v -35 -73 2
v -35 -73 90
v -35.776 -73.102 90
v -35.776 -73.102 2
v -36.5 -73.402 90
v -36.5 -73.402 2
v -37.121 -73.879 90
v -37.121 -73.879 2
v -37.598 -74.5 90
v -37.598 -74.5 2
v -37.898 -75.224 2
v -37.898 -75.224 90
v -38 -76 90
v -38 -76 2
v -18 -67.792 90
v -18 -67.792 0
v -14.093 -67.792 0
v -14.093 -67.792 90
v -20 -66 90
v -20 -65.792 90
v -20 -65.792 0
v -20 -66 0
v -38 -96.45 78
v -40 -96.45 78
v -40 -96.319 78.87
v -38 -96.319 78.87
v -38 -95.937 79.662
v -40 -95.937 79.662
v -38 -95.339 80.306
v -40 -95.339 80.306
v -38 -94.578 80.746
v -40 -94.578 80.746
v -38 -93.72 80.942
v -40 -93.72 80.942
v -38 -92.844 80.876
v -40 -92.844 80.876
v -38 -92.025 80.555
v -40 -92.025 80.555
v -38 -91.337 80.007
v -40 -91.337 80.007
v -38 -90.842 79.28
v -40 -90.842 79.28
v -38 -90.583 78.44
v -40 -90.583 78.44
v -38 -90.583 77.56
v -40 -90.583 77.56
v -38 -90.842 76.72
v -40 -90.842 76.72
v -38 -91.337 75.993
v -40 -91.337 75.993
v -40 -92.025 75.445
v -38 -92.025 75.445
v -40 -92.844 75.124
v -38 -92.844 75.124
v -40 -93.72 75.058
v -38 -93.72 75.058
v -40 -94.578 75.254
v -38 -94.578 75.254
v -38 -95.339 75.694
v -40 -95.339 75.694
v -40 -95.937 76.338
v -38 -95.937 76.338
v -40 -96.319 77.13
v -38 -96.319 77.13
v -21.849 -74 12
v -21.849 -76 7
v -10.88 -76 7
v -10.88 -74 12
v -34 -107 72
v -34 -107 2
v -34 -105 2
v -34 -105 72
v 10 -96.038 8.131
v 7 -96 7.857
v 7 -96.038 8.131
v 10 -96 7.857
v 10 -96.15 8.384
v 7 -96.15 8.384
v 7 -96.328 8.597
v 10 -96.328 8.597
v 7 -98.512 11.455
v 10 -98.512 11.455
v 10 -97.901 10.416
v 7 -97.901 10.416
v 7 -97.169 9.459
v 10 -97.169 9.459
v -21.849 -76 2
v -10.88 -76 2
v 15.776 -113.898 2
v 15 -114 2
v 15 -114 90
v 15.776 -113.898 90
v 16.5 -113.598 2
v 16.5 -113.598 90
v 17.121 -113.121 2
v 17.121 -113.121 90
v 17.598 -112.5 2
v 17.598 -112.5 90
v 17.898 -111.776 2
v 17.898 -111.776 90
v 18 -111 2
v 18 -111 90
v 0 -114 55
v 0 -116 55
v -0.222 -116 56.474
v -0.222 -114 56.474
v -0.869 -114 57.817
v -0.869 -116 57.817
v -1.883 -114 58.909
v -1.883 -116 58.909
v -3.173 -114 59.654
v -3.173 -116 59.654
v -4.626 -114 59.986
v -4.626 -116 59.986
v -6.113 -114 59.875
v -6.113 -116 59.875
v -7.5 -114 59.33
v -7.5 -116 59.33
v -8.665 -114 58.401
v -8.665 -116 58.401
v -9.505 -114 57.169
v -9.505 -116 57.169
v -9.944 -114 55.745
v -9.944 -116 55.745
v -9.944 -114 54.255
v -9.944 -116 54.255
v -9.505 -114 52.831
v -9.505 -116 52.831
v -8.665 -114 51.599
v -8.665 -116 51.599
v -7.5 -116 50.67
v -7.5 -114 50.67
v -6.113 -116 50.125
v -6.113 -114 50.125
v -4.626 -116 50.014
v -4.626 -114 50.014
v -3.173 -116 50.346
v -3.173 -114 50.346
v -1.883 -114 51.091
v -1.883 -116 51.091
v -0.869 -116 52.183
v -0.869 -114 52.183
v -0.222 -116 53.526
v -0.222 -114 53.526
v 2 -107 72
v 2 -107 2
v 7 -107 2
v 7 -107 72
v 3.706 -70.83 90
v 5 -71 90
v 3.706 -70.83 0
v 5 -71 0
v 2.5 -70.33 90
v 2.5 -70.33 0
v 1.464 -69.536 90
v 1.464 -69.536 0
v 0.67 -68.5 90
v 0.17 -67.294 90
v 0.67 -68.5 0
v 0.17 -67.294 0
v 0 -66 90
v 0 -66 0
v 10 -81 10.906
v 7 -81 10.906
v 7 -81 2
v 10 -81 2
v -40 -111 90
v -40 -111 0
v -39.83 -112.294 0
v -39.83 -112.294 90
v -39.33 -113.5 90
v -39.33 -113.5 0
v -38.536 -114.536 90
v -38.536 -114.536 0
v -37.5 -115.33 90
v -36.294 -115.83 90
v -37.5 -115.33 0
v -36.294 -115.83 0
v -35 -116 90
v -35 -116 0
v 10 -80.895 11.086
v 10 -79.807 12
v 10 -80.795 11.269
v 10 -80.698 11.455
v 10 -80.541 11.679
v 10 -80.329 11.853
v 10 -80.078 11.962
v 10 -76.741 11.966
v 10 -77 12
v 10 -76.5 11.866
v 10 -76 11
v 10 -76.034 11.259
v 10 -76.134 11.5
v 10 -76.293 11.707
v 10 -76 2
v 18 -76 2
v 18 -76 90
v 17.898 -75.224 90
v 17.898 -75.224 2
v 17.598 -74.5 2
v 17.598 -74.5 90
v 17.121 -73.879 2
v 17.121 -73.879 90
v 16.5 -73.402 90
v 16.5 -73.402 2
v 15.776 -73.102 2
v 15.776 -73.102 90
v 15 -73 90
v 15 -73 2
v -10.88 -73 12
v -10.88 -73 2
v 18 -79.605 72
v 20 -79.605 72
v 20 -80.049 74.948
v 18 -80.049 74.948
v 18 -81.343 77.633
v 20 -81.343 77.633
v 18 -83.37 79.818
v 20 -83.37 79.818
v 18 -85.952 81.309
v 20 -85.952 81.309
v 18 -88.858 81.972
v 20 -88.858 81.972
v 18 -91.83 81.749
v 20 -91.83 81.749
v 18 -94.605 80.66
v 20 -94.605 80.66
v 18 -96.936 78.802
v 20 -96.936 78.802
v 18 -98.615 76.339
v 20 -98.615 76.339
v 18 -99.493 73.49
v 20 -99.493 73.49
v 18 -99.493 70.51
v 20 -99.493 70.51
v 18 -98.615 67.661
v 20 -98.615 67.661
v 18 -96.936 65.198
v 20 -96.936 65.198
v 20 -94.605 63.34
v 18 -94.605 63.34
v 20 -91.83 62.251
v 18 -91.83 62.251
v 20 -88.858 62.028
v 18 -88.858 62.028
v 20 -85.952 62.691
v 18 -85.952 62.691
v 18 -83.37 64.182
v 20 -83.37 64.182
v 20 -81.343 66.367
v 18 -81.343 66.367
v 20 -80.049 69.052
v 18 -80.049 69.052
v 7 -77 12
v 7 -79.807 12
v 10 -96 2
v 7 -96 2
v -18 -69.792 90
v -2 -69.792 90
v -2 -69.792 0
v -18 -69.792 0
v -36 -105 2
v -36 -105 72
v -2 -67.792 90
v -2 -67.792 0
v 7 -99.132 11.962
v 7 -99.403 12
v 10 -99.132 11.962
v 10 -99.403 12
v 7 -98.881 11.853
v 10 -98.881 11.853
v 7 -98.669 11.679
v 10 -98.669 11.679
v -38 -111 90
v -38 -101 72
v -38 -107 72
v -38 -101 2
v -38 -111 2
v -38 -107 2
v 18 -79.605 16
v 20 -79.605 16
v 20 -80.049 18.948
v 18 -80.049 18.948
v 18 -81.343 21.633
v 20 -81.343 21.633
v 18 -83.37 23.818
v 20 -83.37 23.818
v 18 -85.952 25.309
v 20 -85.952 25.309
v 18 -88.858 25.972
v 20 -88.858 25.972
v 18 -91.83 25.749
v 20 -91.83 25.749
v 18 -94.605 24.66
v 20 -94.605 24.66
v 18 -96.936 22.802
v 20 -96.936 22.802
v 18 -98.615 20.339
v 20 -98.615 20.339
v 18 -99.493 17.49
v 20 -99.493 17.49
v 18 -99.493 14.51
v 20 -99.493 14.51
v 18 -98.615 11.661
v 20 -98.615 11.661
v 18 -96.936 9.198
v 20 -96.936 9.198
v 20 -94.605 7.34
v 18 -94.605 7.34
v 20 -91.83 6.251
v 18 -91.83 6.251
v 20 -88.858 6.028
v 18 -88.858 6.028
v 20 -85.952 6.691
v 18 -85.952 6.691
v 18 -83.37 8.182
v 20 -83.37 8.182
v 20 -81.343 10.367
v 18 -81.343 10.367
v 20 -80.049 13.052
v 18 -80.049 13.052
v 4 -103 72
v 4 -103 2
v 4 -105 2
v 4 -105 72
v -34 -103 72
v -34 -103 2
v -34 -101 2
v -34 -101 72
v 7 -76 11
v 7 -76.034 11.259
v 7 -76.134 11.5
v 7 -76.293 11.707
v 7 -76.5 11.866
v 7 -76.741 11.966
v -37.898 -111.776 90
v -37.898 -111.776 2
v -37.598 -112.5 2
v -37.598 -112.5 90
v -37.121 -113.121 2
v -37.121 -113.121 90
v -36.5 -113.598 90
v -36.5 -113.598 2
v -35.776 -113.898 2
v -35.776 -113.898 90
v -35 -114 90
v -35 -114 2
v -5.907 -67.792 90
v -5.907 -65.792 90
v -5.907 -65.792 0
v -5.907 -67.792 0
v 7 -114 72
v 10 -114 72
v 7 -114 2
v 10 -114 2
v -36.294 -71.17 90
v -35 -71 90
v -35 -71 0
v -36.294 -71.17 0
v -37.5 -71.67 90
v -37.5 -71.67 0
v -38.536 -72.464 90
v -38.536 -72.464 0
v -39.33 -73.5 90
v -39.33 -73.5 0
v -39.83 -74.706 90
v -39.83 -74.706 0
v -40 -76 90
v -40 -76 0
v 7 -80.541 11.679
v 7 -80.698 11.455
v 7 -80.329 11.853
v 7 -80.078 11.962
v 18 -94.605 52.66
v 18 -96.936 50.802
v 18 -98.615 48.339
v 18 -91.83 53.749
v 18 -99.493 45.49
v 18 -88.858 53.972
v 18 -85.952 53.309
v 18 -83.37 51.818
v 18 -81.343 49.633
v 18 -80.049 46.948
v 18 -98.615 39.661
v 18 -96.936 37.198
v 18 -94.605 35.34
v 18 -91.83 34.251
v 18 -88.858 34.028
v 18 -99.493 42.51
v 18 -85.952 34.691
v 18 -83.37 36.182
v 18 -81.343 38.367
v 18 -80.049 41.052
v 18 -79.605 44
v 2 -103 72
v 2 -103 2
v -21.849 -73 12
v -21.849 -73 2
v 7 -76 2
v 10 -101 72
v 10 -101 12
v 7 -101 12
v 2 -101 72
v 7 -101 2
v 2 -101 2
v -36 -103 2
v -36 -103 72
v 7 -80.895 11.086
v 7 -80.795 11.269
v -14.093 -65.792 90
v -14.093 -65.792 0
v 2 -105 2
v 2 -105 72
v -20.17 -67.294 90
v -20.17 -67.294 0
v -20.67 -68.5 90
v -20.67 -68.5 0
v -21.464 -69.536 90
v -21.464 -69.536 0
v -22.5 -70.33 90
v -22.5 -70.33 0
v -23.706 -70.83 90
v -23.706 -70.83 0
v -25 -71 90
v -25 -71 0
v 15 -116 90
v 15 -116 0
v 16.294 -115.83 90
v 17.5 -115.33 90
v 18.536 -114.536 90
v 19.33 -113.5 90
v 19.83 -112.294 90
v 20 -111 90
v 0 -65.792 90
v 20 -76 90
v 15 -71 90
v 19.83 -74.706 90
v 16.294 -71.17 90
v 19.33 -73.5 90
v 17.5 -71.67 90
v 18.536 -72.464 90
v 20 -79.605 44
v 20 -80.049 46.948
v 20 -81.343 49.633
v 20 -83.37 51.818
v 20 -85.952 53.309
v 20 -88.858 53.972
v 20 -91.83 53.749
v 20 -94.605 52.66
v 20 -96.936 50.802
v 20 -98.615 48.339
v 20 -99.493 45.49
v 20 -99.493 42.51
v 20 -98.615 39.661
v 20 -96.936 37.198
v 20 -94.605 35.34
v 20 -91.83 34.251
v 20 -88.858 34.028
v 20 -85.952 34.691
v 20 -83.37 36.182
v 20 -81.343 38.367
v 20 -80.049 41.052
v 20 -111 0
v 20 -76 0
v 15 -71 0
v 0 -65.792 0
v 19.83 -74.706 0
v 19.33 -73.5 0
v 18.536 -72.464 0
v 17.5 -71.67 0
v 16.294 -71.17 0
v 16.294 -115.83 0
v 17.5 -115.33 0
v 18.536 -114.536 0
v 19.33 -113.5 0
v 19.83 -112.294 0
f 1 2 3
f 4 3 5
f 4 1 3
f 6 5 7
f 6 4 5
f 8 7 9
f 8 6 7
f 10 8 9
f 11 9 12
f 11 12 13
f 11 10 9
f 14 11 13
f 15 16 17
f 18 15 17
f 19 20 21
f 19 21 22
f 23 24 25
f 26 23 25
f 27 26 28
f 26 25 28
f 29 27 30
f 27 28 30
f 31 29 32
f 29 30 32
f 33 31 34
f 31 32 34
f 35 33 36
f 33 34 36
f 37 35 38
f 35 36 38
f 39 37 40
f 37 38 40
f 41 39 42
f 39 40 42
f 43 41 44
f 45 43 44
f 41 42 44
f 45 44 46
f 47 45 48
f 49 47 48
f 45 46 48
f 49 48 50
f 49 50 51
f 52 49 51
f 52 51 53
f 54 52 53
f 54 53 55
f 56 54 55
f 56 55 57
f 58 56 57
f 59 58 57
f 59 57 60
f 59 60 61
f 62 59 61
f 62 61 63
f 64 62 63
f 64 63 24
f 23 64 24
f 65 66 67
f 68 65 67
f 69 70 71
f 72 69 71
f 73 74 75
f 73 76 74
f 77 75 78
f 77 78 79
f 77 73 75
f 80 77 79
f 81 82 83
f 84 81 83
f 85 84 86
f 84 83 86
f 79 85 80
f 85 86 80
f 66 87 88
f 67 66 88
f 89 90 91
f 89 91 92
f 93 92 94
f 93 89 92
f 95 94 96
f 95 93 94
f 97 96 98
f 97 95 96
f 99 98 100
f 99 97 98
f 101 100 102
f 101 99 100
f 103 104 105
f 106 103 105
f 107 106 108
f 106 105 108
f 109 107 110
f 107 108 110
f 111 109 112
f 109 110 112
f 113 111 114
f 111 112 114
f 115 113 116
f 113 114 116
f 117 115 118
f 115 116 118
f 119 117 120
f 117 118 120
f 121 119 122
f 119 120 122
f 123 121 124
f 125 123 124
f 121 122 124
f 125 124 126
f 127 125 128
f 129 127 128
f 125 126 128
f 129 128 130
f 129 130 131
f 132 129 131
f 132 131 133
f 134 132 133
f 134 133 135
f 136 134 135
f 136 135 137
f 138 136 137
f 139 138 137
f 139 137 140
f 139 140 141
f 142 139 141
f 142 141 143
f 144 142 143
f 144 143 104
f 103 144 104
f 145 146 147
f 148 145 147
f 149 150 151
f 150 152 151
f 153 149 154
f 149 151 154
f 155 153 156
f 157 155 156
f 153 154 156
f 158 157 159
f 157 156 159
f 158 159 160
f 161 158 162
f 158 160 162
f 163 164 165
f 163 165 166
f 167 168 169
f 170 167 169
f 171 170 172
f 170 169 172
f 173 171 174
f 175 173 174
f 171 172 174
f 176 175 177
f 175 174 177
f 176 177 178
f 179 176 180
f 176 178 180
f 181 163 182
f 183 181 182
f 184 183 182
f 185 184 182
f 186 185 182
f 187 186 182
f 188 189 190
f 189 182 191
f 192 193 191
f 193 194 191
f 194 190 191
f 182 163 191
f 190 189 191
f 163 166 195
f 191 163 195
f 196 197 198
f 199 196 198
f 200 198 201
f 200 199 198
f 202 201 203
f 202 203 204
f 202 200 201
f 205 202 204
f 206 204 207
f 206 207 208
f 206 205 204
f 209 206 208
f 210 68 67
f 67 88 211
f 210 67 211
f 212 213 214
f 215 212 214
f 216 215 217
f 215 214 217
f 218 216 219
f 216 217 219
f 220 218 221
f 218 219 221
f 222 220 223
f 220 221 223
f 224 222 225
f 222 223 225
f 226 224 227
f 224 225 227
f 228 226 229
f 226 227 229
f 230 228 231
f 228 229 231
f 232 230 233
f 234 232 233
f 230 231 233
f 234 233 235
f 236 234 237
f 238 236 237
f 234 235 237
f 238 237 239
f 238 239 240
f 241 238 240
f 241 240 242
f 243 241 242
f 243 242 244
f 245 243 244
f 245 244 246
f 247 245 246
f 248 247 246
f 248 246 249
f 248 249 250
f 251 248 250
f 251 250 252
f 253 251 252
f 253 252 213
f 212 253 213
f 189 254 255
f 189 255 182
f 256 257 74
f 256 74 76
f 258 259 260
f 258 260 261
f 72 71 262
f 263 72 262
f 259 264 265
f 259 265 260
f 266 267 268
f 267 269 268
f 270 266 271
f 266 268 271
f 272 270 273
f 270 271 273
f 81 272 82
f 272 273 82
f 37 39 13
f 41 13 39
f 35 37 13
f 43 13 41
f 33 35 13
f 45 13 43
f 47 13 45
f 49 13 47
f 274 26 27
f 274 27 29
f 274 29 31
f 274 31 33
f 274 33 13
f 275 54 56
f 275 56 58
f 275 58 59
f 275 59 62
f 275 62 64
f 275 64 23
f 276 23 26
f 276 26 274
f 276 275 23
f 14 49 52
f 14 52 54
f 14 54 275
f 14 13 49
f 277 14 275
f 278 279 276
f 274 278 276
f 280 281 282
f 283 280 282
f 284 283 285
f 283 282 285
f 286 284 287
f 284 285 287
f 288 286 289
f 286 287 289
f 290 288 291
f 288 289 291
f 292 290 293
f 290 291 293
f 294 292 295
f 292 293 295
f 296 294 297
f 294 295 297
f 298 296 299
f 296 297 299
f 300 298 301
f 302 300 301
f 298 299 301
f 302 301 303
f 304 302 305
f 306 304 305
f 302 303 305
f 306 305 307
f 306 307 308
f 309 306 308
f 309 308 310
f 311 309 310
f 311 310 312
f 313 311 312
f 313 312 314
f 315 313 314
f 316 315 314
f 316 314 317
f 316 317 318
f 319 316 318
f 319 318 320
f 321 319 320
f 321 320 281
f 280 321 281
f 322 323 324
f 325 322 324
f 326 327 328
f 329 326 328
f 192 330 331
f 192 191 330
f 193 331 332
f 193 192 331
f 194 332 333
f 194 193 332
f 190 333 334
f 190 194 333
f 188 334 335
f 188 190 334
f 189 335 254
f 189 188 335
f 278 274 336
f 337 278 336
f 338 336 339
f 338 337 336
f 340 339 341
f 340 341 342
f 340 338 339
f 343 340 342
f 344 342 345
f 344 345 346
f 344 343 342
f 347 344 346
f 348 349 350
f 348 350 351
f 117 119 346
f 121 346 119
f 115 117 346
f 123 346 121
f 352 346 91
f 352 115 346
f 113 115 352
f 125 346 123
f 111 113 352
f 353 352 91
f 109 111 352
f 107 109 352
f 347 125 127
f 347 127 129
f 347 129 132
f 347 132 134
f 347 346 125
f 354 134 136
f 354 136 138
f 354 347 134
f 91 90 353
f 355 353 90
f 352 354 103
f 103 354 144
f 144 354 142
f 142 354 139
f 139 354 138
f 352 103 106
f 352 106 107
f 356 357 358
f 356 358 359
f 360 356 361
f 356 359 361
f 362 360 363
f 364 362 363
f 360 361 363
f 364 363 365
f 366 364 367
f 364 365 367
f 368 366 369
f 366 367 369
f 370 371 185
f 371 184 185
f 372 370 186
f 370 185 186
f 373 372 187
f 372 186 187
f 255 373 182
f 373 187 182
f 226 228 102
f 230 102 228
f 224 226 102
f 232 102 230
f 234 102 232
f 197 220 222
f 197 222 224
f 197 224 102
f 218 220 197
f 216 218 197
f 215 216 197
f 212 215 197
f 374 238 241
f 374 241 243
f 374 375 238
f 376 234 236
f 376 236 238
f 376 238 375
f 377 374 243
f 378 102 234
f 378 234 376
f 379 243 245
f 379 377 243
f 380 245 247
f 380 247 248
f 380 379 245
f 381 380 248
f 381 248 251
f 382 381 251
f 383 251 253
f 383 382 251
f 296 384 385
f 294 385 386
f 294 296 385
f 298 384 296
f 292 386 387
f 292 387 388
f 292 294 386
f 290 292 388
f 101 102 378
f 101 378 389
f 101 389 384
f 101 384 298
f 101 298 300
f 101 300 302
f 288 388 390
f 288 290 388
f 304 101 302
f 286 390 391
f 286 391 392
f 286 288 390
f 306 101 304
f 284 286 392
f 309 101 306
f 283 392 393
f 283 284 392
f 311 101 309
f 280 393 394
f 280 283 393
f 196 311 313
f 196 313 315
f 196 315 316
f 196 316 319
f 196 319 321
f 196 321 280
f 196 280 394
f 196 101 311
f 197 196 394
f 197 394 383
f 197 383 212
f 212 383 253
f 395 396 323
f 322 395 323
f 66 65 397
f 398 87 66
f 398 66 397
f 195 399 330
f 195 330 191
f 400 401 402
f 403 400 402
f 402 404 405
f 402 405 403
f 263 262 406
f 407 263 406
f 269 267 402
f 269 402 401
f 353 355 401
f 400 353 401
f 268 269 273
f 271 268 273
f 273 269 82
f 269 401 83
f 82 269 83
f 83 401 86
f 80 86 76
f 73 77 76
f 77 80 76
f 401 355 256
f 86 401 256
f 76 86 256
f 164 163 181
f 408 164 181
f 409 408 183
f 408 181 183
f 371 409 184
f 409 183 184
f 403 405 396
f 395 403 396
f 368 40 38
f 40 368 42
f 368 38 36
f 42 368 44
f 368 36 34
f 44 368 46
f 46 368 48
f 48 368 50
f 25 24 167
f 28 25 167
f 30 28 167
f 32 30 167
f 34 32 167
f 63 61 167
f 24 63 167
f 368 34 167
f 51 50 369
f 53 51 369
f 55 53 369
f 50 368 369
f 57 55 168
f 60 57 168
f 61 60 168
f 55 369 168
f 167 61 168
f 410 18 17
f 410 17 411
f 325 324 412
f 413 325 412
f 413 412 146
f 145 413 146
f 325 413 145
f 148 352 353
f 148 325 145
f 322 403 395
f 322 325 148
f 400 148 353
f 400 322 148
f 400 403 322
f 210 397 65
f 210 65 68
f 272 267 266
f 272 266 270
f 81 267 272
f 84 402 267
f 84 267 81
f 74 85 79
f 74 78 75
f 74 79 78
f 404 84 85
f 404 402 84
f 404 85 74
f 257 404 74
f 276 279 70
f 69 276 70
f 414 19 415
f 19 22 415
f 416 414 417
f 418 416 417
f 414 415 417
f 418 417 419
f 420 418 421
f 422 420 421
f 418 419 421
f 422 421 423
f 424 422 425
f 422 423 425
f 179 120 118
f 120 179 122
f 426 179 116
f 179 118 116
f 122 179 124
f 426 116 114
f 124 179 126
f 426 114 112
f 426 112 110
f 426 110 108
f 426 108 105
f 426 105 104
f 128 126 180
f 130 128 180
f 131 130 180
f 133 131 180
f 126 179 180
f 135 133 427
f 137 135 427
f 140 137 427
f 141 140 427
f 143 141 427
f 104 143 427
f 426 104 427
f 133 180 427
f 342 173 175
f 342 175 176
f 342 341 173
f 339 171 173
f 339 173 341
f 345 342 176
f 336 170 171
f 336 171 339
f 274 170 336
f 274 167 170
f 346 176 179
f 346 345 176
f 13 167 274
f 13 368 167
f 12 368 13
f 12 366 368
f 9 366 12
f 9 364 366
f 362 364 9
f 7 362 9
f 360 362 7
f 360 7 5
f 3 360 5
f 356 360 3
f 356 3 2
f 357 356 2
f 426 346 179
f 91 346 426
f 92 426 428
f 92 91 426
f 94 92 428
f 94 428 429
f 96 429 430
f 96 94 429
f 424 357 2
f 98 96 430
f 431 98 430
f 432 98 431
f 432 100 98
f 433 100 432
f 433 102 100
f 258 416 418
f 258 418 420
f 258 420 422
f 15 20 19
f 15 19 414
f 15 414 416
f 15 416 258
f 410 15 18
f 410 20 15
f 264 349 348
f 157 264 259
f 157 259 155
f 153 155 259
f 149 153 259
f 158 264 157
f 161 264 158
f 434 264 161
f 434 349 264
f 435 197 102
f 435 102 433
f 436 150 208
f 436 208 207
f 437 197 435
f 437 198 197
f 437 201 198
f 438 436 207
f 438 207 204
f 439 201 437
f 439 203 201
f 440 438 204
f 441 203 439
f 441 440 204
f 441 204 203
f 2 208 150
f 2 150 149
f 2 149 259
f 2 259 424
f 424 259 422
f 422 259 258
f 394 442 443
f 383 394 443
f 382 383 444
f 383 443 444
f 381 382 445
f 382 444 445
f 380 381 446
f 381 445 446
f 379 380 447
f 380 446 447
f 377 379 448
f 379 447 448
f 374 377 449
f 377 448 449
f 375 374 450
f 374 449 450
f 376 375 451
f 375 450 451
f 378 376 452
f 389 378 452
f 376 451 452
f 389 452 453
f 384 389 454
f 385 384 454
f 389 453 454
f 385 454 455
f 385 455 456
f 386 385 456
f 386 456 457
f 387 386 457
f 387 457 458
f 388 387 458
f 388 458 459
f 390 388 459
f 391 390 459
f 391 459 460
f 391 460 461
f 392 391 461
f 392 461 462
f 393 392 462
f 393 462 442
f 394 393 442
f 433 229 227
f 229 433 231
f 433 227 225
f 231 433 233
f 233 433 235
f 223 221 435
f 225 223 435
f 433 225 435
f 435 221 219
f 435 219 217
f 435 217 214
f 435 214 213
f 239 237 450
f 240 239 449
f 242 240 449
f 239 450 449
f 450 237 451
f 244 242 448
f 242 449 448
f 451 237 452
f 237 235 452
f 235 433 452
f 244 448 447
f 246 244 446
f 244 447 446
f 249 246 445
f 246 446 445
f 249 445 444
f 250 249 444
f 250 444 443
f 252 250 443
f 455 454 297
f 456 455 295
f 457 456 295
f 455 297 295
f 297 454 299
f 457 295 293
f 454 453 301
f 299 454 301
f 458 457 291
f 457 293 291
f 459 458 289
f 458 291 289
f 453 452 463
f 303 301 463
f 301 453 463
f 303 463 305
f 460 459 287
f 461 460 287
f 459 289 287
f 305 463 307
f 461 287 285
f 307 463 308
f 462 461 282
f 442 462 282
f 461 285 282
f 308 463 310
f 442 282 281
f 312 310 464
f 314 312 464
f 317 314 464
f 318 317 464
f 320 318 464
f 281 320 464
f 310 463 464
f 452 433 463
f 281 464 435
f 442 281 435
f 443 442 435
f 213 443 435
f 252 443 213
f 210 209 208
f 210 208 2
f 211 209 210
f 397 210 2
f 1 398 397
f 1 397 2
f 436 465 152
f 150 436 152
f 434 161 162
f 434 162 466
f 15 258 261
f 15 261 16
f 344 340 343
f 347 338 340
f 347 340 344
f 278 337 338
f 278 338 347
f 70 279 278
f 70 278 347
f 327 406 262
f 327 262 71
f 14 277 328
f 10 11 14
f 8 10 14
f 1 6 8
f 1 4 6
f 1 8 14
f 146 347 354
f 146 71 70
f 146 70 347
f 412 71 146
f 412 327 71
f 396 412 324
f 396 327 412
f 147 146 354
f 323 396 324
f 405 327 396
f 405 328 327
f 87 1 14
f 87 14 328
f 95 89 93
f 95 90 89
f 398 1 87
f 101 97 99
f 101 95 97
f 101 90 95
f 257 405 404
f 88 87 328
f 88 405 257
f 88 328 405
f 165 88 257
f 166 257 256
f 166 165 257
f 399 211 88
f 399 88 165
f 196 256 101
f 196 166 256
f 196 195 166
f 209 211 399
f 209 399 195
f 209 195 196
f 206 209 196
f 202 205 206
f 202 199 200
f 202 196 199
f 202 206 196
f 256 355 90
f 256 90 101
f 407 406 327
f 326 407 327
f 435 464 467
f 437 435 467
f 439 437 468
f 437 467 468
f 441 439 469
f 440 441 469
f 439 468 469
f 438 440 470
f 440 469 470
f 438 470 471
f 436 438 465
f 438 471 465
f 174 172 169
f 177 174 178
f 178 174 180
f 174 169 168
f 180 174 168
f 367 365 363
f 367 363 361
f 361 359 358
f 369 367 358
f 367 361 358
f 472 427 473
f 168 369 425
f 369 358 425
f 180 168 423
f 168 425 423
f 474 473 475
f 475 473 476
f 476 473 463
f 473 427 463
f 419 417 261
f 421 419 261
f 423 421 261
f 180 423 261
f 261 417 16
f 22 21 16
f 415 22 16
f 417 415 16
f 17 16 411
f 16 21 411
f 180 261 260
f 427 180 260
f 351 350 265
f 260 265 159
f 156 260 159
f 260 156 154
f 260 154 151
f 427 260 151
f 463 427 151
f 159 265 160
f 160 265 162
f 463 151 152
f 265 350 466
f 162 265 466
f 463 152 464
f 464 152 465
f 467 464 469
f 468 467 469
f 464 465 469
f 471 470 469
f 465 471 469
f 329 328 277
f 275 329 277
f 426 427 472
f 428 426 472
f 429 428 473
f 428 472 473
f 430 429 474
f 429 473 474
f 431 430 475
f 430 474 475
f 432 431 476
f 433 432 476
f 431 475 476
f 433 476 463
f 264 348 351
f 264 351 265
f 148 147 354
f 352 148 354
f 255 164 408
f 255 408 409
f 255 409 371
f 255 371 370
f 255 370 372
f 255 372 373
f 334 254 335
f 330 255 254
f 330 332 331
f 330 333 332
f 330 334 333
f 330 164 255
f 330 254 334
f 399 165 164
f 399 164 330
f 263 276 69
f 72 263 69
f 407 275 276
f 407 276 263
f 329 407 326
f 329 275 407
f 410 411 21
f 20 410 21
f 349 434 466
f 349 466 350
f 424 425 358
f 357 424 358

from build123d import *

# Parameters (mm, degrees)
F1_DEPTH  = 90
F2_T      = -2
F4_DEPTH  = 90
F5_R      = 5
F6_DEPTH  = 25
F7_W      = 10.9698139131
F7_H      = 3
F7_W_2    = 3
F7_H_2    = 5
F8_DEPTH  = 10
F10_DEPTH = 70
F11_R     = 10
F12_DEPTH = 20
F13_R     = 5
F14_SIZE2 = 5
F14_SIZE  = 2
F15_R     = 1
F16_R     = 2.95
F17_DEPTH = 25


# Not quite as in the source:
# - a feature names something its author has since deleted; it is built from what else it names


with BuildPart() as f1:
    # F0 (on Top) → F1 (new body)
    with BuildSketch(Plane.XY):
        with BuildLine():
            Line((-35, -116), (0, -116))
            Line((0, -116), (15, -116))
            ThreePointArc((15, -116), (18.5355339059, -114.5355339059), (20, -111))
            Line((20, -111), (20, -76))
            ThreePointArc((20, -76), (18.5355339059, -72.4644660941), (15, -71))
            Line((15, -71), (-35, -71))
            ThreePointArc((-35, -71), (-38.5355339059, -72.4644660941), (-40, -76))
            Line((-40, -76), (-40, -111))
            ThreePointArc((-40, -111), (-38.5355339059, -114.5355339059), (-35, -116))
        make_face()
    extrude(amount=F1_DEPTH)

    # F2
    f2_openings = [f1.faces().sort_by_distance(p)[0] for p in [
        (-10, -93.5, 90),
    ]]
    offset(amount=F2_T, openings=f2_openings)

    # F3 (on face) → F4 (join, through all)
    with BuildSketch(Plane.XY.offset(90)):
        Polygon((-20, -65.7917543815), (-20, -71), (-10, -71), (0, -71), (0, -65.7917543815), (-5.9066830128, -65.7917543815), (-5.9066830128, -67.7917543815), (-2, -67.7917543815), (-2, -69.7917543815), (-18, -69.7917543815), (-18, -67.7917543815), (-14.0933169872, -67.7917543815), (-14.0933169872, -65.7917543815), align=None)
    extrude(amount=-F4_DEPTH)

    # F5 (on face) → F6 (cut)
    with BuildSketch(Plane.XZ.offset(116)):
        with Locations((-5, 55)):
            Circle(F5_R)
    extrude(amount=-F6_DEPTH, mode=Mode.SUBTRACT)

    # F7 (on face) → F8 (join)
    with BuildSketch(Plane.XY.offset(2)):
        with Locations((-16.3644514978, -74.5)):
            Rectangle(F7_W, F7_H)
        with Locations((8.5, -78.5)):
            Rectangle(F7_W_2, F7_H_2)
        with Locations((8.5, -98.5)):
            Rectangle(F7_W_2, F7_H_2)
    extrude(amount=F8_DEPTH)

    # F9 (on face) → F10 (join)
    with BuildSketch(Plane.XY.offset(2)):
        Polygon((-34, -101), (-38, -101), (-38, -107), (-34, -107), (-34, -105), (-36, -105), (-36, -103), (-34, -103), align=None)
        Polygon((7, -101), (2, -101), (2, -103), (4, -103), (4, -105), (2, -105), (2, -107), (7, -107), (7, -114), (10, -114), (10, -107), (10, -101), align=None)
    extrude(amount=F10_DEPTH)

    # F11 (on face) → F12 (cut)
    with BuildSketch(Plane.YZ.offset(20)):
        with Locations((-89.6050930023, 72)):
            Circle(F11_R)
        with Locations((-89.6050930023, 44)):
            Circle(F11_R)
        with Locations((-89.6050930023, 16)):
            Circle(F11_R)
    extrude(amount=-F12_DEPTH, mode=Mode.SUBTRACT)

    # F13
    f13_edges = [f1.edges().sort_by_distance(p)[0] for p in [
        (0, -71, 45),
        (-20, -71, 45),
    ]]
    fillet(f13_edges, radius=F13_R)

    # F14
    f14_edges = [f1.edges().sort_by_distance(p)[0] for p in [
        (-16.364451, -76, 12),
    ]]
    f14_side = f1.faces().sort_by_distance((-16.364451, -74.5, 12))[0]
    chamfer(f14_edges, length=F14_SIZE, length2=F14_SIZE2, reference=f14_side)

    # F15
    f15_edges = [f1.edges().sort_by_distance(p)[0] for p in [
        (8.5, -80.439942, 12),
        (8.5, -76, 12),
        (8.5, -98.770244, 12),
        (8.5, -96, 8.312012),
    ]]
    fillet(f15_edges, radius=F15_R)

    # F16 (on face) → F17 (cut)
    with BuildSketch(Plane(origin=(-40, 0, 0), x_dir=(0, -1, 0), z_dir=(-1, 0, 0))):
        with Locations((93.5, 78)):
            Circle(F16_R)
    extrude(amount=-F17_DEPTH, mode=Mode.SUBTRACT)


solid = f1.part
